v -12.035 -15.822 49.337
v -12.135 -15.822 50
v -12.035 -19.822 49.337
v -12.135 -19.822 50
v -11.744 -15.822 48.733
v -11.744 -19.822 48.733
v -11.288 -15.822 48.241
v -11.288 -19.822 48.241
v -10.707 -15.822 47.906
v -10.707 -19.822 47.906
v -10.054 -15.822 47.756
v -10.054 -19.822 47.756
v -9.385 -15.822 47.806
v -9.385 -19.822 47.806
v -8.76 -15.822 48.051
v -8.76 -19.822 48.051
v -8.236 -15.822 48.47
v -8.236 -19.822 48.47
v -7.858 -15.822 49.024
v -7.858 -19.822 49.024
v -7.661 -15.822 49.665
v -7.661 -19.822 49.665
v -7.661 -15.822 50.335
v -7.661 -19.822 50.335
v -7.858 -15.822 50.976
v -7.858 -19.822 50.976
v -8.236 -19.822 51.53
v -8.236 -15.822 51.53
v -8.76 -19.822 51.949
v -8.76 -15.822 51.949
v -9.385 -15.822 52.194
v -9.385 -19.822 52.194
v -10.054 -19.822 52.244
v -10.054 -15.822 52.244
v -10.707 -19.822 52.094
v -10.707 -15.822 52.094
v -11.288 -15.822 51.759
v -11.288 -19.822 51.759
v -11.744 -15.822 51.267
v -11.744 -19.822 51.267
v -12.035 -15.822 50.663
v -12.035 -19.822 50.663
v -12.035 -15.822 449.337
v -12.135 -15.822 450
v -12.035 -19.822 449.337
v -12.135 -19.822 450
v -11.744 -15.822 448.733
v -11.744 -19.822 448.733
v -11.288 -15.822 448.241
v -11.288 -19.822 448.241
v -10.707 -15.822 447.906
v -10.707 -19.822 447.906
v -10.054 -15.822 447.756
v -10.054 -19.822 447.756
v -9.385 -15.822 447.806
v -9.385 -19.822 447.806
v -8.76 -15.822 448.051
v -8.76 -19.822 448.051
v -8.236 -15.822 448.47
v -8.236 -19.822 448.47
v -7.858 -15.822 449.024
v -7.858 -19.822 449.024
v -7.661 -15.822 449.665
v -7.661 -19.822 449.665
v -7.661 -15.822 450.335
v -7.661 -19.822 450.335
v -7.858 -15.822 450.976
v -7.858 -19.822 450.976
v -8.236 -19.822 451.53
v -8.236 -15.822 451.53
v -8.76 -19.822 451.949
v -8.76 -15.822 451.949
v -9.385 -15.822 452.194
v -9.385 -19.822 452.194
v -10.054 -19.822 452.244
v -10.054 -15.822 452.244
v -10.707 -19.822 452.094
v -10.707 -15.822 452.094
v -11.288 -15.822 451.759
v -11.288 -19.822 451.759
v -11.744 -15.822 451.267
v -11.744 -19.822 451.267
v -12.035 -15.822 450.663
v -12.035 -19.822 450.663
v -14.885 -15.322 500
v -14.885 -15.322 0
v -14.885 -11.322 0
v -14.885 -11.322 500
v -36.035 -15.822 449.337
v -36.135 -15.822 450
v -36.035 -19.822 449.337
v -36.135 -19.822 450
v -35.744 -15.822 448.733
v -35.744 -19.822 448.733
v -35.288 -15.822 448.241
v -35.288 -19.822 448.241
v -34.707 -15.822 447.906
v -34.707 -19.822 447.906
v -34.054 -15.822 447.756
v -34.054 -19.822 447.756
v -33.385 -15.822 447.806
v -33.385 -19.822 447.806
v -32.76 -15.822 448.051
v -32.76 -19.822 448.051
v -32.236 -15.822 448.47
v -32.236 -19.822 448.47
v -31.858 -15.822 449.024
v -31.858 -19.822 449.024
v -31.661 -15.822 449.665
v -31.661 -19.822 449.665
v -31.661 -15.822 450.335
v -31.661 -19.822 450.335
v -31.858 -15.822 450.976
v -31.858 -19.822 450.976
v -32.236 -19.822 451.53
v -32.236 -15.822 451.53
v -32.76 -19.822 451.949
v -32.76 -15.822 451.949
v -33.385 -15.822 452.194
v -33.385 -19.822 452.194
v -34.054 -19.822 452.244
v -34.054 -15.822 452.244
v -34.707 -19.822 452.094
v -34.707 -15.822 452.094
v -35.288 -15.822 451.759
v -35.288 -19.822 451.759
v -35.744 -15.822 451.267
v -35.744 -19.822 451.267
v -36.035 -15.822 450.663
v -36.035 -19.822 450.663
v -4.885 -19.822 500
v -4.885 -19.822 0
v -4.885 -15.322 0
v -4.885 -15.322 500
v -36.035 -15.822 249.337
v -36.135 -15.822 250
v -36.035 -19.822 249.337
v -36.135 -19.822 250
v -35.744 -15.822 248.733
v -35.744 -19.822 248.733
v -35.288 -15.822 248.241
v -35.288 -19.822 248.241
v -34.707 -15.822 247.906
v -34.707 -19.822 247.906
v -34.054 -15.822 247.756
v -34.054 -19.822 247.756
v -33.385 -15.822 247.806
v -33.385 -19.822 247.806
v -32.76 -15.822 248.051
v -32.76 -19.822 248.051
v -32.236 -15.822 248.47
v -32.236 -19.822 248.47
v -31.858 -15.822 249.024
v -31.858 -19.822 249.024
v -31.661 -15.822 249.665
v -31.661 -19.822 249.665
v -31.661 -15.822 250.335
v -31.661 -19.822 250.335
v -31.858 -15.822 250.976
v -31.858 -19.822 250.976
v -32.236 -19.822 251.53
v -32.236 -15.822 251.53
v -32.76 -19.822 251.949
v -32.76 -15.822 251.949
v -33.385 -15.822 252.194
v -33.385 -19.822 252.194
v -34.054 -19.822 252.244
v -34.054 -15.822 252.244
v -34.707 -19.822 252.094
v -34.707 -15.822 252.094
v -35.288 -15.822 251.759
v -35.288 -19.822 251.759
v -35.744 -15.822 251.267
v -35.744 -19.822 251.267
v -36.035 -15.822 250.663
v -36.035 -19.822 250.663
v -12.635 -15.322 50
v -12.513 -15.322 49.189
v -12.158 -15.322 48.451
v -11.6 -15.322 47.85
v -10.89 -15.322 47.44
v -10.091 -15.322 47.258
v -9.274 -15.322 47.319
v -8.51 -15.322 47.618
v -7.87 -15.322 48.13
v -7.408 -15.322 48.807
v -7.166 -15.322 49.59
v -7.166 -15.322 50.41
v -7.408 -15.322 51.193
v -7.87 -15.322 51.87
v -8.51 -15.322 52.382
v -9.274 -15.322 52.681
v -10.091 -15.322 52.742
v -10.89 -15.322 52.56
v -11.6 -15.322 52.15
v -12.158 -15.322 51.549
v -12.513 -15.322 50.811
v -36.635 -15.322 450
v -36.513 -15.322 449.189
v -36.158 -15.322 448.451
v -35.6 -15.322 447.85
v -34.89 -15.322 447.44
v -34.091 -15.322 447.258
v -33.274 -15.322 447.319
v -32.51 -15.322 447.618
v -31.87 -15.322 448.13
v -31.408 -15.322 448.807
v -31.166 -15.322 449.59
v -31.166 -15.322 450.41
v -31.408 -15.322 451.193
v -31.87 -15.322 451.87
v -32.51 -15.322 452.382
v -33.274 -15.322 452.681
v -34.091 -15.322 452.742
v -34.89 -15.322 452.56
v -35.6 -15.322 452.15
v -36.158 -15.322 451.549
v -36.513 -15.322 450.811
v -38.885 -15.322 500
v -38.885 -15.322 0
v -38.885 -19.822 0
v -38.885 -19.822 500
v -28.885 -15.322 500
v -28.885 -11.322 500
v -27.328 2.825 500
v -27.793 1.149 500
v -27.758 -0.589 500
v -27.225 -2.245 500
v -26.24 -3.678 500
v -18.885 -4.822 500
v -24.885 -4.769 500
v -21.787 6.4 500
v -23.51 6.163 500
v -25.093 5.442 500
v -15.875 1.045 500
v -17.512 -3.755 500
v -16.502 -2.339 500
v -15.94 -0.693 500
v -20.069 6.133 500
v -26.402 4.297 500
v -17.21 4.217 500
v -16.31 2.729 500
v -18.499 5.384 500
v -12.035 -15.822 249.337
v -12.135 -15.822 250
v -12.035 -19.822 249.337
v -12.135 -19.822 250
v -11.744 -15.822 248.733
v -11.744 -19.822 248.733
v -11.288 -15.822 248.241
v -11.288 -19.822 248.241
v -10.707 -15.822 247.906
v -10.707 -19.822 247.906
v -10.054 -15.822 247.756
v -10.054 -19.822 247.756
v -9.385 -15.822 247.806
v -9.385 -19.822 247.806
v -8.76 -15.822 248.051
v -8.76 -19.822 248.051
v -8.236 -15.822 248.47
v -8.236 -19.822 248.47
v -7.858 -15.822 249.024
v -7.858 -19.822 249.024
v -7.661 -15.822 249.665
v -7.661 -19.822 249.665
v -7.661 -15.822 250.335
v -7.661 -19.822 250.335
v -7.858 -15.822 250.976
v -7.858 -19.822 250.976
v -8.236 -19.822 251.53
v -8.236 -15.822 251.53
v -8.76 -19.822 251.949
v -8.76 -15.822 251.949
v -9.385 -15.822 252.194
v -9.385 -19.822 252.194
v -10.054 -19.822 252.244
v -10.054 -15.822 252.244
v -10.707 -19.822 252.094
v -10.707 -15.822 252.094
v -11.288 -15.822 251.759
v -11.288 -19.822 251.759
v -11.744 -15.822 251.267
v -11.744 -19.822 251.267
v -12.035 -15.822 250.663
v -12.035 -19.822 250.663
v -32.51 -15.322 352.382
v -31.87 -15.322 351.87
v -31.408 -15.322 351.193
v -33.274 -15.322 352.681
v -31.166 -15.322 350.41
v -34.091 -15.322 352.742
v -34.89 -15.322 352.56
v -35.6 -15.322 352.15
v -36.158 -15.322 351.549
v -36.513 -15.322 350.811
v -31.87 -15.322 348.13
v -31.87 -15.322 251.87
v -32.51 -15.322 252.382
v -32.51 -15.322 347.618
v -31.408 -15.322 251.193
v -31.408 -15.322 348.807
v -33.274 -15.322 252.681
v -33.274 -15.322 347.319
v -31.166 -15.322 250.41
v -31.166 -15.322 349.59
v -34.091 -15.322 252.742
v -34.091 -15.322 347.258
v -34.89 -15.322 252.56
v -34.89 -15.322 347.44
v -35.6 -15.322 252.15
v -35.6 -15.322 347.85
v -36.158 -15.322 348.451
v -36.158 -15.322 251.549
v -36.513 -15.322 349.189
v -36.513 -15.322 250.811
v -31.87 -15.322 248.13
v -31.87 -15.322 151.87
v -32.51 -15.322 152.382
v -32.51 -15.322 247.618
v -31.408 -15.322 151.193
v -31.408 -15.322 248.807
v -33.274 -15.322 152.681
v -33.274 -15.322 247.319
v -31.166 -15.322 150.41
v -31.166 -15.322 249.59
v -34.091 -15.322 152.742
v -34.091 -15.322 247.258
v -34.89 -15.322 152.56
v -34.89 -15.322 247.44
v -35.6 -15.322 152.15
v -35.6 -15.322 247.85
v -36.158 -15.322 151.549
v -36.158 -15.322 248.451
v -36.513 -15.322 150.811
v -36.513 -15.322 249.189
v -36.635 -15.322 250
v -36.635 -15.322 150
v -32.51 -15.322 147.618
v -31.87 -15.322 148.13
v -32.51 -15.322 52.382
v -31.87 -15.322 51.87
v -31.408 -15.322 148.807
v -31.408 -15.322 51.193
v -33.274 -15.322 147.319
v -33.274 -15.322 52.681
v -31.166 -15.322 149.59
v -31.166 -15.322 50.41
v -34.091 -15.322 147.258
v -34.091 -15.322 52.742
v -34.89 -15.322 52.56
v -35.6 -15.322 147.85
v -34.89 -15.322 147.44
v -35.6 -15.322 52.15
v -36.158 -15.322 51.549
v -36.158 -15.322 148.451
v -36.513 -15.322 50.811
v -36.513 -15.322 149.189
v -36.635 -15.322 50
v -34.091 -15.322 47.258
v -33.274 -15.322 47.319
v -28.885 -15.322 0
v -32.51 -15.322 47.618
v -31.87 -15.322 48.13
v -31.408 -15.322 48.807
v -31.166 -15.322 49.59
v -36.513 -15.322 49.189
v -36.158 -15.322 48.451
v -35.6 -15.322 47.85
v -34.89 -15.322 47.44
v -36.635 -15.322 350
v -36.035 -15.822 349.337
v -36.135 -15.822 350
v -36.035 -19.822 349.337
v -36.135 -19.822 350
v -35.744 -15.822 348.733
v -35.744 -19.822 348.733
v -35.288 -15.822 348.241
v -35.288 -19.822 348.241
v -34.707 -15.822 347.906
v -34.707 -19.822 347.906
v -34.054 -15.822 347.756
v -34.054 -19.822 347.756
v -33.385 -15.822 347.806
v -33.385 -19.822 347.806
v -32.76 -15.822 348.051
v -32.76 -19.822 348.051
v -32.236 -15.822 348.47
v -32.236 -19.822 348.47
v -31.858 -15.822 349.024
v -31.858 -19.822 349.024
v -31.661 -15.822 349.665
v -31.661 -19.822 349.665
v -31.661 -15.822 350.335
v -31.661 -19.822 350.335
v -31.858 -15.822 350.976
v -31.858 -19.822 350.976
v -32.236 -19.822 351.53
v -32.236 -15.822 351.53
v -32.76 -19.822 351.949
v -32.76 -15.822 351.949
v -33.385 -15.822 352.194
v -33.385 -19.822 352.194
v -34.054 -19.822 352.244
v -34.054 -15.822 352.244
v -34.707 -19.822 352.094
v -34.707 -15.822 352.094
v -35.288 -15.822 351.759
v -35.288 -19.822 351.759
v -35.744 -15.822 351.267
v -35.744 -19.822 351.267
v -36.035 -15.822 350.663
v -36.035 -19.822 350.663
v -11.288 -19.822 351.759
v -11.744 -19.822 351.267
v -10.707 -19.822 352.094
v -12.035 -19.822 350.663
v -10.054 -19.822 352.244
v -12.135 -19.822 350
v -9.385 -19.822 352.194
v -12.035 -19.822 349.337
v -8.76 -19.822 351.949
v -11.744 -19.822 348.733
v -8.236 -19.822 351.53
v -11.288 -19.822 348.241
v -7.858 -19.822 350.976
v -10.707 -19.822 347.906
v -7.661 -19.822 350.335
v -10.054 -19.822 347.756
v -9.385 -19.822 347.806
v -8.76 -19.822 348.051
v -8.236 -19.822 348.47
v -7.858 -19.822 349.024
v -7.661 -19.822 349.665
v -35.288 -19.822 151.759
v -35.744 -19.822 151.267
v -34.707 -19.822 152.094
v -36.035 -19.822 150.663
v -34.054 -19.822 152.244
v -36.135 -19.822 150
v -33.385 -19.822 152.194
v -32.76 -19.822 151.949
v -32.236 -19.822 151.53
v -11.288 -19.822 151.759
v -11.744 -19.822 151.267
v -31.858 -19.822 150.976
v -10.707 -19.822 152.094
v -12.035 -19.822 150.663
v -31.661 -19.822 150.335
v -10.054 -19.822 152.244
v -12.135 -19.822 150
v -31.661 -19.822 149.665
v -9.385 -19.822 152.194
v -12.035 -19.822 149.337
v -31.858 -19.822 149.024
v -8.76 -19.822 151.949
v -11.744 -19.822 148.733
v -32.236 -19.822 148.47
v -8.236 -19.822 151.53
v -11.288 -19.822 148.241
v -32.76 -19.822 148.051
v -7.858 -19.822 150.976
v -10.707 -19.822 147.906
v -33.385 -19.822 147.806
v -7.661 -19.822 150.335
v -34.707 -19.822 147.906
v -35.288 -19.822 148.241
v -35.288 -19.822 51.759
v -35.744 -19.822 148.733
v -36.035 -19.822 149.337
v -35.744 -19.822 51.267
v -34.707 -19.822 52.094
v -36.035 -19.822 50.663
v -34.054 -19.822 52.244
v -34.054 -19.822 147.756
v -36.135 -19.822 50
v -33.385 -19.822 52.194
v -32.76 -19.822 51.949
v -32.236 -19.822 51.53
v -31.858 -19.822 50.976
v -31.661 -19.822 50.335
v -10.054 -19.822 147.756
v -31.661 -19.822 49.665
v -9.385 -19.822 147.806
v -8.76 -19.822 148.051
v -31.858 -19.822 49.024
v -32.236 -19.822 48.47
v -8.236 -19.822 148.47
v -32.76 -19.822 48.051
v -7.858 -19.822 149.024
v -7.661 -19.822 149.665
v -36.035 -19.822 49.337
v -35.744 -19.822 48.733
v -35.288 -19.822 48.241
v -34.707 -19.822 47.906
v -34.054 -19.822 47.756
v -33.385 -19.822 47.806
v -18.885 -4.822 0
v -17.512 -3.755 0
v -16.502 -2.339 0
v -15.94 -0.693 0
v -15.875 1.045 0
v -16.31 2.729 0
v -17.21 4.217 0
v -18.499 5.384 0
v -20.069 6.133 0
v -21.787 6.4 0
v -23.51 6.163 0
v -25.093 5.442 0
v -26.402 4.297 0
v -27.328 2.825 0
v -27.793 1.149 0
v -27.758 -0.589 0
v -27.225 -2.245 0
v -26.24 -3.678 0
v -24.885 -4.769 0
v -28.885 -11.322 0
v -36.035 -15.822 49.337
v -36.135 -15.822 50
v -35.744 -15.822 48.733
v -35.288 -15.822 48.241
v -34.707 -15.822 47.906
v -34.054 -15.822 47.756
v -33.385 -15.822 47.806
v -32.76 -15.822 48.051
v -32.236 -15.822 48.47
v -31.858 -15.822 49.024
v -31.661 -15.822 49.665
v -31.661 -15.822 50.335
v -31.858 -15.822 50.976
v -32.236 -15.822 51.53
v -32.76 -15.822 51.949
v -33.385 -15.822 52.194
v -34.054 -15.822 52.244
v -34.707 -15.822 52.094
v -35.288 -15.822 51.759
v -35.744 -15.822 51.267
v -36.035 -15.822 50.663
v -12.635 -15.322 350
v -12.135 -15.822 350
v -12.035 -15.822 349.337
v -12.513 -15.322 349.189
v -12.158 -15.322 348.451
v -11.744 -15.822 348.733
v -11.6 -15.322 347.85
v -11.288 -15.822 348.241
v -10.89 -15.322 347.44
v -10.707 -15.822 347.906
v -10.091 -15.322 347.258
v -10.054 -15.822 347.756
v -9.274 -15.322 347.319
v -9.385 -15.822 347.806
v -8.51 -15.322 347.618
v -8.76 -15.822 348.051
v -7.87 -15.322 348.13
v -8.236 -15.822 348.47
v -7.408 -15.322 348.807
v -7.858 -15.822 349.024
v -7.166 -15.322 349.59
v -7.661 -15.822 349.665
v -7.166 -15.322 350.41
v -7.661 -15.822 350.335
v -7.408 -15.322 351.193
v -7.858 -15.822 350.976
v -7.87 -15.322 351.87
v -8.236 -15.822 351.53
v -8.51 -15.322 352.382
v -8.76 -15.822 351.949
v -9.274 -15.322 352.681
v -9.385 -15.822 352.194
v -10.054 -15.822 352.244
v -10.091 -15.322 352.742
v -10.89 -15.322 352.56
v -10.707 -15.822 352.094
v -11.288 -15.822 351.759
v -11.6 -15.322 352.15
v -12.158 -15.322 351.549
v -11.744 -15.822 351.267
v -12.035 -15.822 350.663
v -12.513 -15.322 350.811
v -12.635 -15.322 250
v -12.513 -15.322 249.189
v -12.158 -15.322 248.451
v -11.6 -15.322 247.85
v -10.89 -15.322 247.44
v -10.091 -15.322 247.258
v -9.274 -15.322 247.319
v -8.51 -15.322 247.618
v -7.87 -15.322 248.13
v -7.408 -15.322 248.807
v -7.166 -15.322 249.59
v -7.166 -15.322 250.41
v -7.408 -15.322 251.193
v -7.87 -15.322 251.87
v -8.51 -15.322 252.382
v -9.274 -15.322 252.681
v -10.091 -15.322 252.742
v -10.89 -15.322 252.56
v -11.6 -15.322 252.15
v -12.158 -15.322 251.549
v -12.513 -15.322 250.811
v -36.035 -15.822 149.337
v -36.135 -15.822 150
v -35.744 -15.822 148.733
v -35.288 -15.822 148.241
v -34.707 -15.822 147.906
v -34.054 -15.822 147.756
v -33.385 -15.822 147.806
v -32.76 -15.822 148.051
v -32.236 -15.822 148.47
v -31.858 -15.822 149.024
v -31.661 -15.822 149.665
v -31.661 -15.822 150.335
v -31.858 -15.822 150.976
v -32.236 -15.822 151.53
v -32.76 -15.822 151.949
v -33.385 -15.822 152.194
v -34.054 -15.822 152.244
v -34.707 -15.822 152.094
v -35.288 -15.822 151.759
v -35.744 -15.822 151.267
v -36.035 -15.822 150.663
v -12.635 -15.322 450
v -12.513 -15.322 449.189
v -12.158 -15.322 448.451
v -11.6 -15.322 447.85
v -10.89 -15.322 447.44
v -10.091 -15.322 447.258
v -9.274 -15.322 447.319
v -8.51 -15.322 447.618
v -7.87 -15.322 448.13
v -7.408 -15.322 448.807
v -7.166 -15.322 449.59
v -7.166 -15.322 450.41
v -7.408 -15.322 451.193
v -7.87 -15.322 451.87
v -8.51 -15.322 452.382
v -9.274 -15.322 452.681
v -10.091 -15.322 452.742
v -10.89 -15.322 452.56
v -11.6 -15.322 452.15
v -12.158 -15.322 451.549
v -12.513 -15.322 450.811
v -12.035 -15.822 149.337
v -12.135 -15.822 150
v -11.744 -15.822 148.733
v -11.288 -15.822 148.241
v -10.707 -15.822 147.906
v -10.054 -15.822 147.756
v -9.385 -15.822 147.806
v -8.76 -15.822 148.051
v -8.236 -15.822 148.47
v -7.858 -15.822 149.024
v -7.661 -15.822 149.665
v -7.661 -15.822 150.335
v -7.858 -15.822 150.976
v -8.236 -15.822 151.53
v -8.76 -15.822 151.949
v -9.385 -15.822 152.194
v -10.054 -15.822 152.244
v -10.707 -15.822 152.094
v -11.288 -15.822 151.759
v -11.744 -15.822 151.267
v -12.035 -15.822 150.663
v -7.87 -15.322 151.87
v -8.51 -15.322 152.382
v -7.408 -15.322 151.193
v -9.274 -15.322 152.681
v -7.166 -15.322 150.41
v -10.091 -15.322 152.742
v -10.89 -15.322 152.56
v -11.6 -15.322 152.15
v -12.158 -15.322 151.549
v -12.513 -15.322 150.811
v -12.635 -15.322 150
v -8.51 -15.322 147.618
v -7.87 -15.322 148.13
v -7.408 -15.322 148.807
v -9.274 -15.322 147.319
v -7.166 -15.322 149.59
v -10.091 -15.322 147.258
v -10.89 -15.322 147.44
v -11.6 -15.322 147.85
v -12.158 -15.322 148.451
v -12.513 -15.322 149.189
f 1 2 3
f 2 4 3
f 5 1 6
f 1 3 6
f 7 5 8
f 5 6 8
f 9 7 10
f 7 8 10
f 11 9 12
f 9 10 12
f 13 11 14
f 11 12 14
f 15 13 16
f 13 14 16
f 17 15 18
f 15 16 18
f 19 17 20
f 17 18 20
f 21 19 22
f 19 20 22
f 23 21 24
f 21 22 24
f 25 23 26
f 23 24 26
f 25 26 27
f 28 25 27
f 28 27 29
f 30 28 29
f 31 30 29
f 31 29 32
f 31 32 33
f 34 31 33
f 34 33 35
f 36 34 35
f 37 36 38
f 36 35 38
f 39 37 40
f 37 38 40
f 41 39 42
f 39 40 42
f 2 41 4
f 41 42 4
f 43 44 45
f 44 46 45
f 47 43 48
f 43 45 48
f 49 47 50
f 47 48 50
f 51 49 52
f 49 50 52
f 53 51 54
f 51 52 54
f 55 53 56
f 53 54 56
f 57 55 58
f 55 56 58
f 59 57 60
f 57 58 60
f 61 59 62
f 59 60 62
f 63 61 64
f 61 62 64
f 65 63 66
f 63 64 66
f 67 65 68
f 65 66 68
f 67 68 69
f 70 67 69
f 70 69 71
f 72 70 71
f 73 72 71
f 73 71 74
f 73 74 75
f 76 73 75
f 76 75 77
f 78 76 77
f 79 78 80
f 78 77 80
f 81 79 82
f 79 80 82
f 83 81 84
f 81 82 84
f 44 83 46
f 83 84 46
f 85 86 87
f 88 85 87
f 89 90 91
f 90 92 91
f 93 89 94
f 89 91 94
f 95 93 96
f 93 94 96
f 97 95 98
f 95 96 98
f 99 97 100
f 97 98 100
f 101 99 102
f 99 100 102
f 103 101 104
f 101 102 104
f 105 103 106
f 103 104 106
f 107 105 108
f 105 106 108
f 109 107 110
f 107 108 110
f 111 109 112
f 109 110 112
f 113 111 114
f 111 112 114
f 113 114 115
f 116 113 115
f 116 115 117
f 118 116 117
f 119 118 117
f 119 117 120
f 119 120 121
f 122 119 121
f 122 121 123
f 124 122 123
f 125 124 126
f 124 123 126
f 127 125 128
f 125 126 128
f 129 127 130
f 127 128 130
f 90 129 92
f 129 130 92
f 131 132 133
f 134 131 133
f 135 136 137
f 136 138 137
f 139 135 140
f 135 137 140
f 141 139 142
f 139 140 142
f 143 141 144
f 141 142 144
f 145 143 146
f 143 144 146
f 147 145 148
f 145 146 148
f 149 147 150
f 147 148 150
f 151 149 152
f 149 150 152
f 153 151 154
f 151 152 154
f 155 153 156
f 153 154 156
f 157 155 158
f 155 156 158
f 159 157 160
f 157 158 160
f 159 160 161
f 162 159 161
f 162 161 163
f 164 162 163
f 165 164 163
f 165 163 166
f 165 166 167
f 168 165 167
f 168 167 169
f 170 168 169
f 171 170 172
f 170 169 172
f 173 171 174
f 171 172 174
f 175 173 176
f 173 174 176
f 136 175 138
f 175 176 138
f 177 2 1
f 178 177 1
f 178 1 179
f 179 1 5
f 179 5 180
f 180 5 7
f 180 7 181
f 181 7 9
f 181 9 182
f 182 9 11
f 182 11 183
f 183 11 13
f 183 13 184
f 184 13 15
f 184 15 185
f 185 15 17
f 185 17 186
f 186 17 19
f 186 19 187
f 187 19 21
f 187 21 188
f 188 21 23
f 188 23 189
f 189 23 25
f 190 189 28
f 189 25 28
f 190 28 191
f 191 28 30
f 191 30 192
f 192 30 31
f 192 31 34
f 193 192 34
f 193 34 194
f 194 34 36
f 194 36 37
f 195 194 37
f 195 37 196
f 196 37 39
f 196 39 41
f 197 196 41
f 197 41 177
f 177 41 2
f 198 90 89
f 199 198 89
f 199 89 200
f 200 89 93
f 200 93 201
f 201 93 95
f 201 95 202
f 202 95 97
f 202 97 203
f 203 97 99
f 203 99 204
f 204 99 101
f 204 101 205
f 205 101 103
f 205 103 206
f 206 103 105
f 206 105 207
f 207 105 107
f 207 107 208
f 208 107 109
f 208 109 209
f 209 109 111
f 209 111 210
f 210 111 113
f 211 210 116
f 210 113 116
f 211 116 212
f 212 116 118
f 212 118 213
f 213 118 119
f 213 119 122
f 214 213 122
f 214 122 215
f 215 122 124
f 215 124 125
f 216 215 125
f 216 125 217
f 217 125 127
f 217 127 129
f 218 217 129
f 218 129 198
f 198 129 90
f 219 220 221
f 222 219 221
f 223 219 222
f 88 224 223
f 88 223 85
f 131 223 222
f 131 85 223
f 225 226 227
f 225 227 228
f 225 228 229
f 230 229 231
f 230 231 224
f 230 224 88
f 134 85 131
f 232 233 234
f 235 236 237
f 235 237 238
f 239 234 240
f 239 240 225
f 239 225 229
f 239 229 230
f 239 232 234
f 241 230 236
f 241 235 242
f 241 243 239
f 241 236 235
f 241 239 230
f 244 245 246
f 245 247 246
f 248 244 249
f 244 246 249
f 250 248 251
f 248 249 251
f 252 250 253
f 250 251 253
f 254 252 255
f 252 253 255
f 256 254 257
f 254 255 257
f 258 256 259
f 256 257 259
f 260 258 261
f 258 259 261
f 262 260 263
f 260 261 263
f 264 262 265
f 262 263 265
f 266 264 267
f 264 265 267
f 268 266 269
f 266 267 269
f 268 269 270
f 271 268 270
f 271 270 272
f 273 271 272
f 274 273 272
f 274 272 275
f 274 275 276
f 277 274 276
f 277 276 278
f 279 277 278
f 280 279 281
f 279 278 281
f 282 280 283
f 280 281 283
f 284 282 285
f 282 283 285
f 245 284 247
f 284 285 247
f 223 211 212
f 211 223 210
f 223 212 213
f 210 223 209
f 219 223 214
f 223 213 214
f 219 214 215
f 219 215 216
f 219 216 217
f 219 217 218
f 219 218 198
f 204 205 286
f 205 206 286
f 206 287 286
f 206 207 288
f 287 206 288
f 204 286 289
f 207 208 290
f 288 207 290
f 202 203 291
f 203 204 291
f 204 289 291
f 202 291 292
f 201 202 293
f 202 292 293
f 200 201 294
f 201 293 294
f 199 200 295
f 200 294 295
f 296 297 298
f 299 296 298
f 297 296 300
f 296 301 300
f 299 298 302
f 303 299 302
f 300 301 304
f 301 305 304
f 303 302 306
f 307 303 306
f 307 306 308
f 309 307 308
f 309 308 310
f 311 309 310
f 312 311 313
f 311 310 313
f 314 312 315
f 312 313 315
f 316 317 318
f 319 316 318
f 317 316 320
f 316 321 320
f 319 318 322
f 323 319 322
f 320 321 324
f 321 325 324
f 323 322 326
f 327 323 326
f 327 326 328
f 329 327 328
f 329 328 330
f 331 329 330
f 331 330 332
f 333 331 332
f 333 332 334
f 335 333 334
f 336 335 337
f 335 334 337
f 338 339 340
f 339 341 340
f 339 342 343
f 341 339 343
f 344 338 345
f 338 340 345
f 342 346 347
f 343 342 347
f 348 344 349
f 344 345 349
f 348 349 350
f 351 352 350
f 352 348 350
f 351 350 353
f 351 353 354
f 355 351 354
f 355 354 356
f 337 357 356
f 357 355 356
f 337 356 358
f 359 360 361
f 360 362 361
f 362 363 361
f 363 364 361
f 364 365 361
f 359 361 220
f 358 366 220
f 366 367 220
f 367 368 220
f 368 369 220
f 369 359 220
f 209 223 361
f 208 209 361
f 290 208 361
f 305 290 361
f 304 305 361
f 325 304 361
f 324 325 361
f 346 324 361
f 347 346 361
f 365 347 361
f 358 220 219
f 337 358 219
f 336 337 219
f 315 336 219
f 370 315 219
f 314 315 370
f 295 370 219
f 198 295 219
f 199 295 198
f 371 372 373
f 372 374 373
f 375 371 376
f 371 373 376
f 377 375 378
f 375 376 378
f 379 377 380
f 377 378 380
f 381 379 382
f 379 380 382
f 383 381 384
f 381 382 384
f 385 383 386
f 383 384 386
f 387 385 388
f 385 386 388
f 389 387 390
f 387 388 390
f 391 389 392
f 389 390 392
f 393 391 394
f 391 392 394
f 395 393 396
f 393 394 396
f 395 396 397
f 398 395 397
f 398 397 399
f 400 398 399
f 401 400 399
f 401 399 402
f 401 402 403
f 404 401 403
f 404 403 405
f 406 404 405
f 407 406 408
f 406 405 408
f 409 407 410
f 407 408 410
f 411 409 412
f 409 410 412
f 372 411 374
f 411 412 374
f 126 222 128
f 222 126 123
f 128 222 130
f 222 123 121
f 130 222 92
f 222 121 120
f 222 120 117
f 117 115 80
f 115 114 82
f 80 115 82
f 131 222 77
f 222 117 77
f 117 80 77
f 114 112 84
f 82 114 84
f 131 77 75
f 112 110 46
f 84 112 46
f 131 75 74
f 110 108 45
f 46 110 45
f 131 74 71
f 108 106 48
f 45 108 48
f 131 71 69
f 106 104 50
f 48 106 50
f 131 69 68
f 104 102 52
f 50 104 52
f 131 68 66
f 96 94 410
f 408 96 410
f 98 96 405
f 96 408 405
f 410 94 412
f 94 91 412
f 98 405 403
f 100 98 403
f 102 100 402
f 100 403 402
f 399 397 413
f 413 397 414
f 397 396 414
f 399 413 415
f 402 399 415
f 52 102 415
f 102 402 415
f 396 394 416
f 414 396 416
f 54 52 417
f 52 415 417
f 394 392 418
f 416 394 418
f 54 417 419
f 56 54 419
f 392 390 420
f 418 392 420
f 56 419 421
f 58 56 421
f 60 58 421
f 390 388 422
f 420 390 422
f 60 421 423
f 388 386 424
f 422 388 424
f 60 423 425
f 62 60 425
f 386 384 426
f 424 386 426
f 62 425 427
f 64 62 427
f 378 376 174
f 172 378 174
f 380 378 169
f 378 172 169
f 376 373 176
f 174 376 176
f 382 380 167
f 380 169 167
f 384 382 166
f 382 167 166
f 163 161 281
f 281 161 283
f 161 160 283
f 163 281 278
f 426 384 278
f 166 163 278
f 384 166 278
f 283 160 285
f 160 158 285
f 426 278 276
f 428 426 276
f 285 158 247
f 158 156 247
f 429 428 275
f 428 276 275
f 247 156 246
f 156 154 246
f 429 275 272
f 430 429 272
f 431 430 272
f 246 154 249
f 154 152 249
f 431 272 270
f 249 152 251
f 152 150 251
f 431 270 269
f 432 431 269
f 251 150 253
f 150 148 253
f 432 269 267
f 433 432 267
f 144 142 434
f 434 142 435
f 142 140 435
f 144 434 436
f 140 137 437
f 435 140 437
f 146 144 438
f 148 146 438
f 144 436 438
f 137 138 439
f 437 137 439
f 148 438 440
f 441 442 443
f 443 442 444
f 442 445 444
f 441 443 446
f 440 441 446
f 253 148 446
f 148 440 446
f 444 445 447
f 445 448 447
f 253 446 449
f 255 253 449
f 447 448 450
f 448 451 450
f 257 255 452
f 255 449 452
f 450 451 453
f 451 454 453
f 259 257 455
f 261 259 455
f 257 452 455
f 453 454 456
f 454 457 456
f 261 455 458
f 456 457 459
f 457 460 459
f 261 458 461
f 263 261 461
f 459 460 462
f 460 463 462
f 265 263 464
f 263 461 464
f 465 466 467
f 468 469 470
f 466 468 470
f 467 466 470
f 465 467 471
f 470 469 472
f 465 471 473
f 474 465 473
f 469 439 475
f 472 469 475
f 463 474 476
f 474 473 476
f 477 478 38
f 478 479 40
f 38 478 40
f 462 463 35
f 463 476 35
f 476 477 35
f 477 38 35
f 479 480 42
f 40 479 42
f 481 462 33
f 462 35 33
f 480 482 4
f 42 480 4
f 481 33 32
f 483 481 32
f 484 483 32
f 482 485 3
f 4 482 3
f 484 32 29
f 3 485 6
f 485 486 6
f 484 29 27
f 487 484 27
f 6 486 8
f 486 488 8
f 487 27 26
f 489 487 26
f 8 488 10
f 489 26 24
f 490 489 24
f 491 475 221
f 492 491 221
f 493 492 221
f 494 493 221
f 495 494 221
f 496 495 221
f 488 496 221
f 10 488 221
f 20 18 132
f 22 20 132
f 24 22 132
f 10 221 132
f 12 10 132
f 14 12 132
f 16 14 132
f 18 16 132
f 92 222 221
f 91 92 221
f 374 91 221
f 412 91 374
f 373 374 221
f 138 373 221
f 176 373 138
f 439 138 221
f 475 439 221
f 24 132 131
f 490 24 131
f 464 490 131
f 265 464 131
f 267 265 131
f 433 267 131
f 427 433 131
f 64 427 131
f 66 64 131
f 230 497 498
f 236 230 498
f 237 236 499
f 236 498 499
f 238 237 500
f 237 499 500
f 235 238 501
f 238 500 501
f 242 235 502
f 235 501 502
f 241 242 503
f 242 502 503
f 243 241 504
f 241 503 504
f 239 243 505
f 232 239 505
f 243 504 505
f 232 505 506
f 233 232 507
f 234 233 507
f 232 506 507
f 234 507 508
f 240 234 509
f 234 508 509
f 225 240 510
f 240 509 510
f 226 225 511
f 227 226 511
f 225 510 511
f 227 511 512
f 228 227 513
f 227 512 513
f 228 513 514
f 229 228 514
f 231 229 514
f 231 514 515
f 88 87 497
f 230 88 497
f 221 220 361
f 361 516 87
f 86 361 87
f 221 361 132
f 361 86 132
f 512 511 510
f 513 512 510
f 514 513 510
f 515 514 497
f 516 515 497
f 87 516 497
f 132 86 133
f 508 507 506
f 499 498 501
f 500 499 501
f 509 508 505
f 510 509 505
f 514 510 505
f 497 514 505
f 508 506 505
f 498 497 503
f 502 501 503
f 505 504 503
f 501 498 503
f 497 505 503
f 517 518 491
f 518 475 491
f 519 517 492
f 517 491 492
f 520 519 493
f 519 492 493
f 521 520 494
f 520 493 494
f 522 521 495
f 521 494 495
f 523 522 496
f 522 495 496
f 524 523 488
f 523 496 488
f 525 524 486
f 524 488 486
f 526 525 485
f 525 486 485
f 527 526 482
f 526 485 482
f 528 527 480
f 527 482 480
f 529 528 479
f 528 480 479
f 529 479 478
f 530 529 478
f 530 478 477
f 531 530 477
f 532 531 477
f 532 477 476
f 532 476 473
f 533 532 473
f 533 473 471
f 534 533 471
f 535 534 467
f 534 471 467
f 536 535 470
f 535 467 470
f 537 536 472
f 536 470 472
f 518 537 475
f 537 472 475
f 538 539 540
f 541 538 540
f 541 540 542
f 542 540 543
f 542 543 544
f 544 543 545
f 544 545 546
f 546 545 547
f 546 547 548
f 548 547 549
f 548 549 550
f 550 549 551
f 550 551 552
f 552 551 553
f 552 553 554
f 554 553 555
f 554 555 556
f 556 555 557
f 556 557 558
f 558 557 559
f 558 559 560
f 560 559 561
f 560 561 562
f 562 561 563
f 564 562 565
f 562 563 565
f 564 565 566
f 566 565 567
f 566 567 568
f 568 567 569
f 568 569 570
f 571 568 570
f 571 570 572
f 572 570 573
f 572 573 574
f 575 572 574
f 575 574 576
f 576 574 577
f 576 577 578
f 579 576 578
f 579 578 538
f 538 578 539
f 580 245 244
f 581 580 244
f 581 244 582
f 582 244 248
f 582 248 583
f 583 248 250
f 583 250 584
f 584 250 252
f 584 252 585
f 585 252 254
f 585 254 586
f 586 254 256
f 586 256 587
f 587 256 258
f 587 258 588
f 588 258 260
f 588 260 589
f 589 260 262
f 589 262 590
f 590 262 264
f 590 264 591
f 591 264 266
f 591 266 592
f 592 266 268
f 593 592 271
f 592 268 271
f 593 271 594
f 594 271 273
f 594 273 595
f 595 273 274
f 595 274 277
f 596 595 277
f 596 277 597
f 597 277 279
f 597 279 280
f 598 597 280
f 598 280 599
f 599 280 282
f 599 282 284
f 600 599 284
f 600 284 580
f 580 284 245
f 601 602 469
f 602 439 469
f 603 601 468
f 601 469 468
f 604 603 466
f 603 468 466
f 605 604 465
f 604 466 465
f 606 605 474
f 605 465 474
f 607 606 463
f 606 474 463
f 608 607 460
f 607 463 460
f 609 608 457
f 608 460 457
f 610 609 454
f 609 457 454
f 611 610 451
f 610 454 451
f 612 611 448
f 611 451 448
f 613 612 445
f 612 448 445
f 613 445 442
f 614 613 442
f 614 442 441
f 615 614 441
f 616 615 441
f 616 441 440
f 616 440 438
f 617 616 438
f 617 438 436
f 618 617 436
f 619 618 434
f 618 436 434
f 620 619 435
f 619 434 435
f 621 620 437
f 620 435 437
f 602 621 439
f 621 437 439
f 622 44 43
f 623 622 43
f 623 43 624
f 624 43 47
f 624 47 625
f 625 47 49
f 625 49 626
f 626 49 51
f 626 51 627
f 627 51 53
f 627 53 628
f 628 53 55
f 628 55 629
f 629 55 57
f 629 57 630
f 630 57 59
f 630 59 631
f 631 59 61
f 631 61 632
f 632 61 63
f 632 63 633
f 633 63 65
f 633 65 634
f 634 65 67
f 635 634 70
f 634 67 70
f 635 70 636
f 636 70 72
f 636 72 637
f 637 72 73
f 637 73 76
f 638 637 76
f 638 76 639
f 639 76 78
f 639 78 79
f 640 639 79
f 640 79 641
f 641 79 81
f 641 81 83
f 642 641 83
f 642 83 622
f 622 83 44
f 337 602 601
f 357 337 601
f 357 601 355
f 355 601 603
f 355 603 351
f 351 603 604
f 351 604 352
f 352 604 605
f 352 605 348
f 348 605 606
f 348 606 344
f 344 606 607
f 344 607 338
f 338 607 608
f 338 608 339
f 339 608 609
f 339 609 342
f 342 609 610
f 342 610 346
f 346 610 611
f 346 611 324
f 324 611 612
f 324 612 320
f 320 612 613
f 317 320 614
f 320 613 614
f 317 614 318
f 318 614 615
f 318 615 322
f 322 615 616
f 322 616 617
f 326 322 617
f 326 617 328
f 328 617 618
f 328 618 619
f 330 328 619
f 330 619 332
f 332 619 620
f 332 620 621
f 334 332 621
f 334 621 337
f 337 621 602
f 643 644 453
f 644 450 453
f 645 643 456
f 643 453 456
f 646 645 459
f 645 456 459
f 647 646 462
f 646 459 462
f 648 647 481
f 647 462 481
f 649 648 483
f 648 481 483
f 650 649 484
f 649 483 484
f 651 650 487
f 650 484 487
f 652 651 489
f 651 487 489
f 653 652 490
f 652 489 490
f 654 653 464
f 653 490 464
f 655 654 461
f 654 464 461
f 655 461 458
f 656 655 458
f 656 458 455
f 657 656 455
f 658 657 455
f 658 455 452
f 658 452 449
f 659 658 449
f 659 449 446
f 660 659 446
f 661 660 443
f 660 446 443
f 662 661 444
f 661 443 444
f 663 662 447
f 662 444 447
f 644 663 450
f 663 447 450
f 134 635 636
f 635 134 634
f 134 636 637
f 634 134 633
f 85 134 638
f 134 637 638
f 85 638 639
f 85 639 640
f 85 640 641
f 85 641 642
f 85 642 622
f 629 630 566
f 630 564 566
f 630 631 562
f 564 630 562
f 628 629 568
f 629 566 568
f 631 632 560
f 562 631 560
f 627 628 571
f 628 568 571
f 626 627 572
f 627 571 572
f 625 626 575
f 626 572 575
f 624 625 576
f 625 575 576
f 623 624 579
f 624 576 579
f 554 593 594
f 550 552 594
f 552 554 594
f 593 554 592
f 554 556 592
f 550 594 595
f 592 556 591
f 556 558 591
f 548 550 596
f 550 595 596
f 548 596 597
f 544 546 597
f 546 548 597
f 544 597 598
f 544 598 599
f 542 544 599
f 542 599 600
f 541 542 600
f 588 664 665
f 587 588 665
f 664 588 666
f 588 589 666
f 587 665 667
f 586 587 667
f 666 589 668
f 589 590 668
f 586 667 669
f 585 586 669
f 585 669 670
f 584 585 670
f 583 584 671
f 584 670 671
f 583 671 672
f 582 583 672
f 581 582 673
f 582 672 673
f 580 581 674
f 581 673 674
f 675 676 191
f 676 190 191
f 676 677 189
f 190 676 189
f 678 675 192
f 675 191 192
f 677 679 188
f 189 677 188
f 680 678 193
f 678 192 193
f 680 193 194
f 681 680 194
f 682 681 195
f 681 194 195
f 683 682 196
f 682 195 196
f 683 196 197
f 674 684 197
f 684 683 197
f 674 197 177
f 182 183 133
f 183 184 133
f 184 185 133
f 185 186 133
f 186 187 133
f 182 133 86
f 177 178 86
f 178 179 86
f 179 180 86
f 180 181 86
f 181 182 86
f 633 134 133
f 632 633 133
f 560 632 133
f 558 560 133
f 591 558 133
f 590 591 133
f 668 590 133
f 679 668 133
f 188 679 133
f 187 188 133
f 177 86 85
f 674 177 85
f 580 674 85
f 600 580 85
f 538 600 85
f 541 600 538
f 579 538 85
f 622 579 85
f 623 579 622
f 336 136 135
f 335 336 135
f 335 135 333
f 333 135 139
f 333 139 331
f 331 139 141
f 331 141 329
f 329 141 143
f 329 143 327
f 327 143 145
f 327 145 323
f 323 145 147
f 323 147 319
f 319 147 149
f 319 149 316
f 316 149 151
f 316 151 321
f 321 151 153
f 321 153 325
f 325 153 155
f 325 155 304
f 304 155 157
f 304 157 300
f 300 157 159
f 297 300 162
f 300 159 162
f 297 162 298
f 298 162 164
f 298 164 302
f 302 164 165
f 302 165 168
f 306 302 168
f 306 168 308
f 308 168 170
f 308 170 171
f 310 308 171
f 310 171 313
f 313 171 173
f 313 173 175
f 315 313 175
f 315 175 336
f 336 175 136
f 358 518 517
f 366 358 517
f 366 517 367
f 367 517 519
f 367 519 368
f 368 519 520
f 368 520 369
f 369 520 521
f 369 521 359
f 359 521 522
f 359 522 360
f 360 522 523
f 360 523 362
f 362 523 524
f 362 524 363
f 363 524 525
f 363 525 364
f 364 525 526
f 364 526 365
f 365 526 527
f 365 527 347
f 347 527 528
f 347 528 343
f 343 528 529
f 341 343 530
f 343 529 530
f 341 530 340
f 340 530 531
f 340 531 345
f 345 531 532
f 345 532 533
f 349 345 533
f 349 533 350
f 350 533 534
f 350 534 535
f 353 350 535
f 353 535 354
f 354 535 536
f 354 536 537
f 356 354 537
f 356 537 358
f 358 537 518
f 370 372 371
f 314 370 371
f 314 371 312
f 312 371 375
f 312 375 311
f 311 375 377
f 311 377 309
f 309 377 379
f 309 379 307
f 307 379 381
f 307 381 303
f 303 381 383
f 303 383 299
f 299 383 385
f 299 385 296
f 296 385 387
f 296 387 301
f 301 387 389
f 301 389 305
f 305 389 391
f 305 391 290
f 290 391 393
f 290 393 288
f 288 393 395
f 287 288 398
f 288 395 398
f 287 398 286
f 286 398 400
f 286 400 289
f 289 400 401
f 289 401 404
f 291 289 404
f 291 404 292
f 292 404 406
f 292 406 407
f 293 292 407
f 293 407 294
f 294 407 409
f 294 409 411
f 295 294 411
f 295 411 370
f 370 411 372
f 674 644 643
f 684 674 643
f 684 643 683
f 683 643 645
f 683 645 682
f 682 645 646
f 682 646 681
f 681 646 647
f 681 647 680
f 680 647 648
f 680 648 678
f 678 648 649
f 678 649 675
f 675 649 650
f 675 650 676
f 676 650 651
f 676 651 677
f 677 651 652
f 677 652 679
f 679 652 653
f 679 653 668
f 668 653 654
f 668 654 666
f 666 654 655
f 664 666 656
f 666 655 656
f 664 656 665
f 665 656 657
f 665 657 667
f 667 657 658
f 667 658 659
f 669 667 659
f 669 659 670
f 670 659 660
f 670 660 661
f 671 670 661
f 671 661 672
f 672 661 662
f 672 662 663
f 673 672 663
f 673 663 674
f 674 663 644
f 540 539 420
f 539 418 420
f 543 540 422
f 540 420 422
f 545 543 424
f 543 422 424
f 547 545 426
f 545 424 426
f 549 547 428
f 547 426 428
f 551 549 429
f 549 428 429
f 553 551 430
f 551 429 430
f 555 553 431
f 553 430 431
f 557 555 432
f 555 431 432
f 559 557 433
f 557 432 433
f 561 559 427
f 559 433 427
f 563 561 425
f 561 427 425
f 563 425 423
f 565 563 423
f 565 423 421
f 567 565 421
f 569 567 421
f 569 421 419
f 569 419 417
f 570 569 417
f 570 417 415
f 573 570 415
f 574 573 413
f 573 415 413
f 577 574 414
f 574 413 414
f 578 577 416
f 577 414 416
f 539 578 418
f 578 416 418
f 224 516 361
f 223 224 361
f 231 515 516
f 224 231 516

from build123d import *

# Parameters (mm, degrees)
EXTRUSION1_DEPTH                               = 500
FRAISAGE_POUR_VIS_T_TE_FRAIS_E_M41_D           = 4.5
FRAISAGE_POUR_VIS_T_TE_FRAIS_E_M41_CSINK_D     = 5.5
FRAISAGE_POUR_VIS_T_TE_FRAIS_E_M41_CSINK_ANGLE = 90


with BuildPart() as part:
    # Esquisse1 → Extrusion1 (new body)
    with BuildSketch(Plane.XY):
        with BuildLine():
            Line((-38.885451278, -19.821642953), (-4.885451278, -19.821642953))
            Line((-4.885451278, -19.821642953), (-4.885451278, -15.321642953))
            Line((-4.885451278, -15.321642953), (-14.885451278, -15.321642953))
            Line((-14.885451278, -15.321642953), (-14.885451278, -11.321642953))
            Line((-14.885451278, -11.321642953), (-18.885451278, -4.821642953))
            ThreePointArc((-18.885451278, -4.821642953), (-21.78726352, 6.400322803), (-24.885451278, -4.769021956))
            Line((-24.885451278, -4.769021956), (-28.885451278, -11.321642953))
            Line((-28.885451278, -11.321642953), (-28.885451278, -15.321642953))
            Line((-28.885451278, -15.321642953), (-38.885451278, -15.321642953))
            Line((-38.885451278, -15.321642953), (-38.885451278, -19.821642953))
        make_face()
    extrude(amount=EXTRUSION1_DEPTH)

    # Fraisage pour vis à tête fraisée M41 (through all)
    with Locations(Plane(origin=(-33.885451278, -15.321642953, 50), x_dir=(1, 0, 0), z_dir=(0, 1, 0))):
        with Locations((0, 0), (0, -100), (0, -200), (24, -200), (24, -100), (24, 0), (24, -300), (24, -400), (0, -300), (0, -400)):
            CounterSinkHole(FRAISAGE_POUR_VIS_T_TE_FRAIS_E_M41_D / 2, FRAISAGE_POUR_VIS_T_TE_FRAIS_E_M41_CSINK_D / 2, counter_sink_angle=FRAISAGE_POUR_VIS_T_TE_FRAIS_E_M41_CSINK_ANGLE)


solid = part.part
